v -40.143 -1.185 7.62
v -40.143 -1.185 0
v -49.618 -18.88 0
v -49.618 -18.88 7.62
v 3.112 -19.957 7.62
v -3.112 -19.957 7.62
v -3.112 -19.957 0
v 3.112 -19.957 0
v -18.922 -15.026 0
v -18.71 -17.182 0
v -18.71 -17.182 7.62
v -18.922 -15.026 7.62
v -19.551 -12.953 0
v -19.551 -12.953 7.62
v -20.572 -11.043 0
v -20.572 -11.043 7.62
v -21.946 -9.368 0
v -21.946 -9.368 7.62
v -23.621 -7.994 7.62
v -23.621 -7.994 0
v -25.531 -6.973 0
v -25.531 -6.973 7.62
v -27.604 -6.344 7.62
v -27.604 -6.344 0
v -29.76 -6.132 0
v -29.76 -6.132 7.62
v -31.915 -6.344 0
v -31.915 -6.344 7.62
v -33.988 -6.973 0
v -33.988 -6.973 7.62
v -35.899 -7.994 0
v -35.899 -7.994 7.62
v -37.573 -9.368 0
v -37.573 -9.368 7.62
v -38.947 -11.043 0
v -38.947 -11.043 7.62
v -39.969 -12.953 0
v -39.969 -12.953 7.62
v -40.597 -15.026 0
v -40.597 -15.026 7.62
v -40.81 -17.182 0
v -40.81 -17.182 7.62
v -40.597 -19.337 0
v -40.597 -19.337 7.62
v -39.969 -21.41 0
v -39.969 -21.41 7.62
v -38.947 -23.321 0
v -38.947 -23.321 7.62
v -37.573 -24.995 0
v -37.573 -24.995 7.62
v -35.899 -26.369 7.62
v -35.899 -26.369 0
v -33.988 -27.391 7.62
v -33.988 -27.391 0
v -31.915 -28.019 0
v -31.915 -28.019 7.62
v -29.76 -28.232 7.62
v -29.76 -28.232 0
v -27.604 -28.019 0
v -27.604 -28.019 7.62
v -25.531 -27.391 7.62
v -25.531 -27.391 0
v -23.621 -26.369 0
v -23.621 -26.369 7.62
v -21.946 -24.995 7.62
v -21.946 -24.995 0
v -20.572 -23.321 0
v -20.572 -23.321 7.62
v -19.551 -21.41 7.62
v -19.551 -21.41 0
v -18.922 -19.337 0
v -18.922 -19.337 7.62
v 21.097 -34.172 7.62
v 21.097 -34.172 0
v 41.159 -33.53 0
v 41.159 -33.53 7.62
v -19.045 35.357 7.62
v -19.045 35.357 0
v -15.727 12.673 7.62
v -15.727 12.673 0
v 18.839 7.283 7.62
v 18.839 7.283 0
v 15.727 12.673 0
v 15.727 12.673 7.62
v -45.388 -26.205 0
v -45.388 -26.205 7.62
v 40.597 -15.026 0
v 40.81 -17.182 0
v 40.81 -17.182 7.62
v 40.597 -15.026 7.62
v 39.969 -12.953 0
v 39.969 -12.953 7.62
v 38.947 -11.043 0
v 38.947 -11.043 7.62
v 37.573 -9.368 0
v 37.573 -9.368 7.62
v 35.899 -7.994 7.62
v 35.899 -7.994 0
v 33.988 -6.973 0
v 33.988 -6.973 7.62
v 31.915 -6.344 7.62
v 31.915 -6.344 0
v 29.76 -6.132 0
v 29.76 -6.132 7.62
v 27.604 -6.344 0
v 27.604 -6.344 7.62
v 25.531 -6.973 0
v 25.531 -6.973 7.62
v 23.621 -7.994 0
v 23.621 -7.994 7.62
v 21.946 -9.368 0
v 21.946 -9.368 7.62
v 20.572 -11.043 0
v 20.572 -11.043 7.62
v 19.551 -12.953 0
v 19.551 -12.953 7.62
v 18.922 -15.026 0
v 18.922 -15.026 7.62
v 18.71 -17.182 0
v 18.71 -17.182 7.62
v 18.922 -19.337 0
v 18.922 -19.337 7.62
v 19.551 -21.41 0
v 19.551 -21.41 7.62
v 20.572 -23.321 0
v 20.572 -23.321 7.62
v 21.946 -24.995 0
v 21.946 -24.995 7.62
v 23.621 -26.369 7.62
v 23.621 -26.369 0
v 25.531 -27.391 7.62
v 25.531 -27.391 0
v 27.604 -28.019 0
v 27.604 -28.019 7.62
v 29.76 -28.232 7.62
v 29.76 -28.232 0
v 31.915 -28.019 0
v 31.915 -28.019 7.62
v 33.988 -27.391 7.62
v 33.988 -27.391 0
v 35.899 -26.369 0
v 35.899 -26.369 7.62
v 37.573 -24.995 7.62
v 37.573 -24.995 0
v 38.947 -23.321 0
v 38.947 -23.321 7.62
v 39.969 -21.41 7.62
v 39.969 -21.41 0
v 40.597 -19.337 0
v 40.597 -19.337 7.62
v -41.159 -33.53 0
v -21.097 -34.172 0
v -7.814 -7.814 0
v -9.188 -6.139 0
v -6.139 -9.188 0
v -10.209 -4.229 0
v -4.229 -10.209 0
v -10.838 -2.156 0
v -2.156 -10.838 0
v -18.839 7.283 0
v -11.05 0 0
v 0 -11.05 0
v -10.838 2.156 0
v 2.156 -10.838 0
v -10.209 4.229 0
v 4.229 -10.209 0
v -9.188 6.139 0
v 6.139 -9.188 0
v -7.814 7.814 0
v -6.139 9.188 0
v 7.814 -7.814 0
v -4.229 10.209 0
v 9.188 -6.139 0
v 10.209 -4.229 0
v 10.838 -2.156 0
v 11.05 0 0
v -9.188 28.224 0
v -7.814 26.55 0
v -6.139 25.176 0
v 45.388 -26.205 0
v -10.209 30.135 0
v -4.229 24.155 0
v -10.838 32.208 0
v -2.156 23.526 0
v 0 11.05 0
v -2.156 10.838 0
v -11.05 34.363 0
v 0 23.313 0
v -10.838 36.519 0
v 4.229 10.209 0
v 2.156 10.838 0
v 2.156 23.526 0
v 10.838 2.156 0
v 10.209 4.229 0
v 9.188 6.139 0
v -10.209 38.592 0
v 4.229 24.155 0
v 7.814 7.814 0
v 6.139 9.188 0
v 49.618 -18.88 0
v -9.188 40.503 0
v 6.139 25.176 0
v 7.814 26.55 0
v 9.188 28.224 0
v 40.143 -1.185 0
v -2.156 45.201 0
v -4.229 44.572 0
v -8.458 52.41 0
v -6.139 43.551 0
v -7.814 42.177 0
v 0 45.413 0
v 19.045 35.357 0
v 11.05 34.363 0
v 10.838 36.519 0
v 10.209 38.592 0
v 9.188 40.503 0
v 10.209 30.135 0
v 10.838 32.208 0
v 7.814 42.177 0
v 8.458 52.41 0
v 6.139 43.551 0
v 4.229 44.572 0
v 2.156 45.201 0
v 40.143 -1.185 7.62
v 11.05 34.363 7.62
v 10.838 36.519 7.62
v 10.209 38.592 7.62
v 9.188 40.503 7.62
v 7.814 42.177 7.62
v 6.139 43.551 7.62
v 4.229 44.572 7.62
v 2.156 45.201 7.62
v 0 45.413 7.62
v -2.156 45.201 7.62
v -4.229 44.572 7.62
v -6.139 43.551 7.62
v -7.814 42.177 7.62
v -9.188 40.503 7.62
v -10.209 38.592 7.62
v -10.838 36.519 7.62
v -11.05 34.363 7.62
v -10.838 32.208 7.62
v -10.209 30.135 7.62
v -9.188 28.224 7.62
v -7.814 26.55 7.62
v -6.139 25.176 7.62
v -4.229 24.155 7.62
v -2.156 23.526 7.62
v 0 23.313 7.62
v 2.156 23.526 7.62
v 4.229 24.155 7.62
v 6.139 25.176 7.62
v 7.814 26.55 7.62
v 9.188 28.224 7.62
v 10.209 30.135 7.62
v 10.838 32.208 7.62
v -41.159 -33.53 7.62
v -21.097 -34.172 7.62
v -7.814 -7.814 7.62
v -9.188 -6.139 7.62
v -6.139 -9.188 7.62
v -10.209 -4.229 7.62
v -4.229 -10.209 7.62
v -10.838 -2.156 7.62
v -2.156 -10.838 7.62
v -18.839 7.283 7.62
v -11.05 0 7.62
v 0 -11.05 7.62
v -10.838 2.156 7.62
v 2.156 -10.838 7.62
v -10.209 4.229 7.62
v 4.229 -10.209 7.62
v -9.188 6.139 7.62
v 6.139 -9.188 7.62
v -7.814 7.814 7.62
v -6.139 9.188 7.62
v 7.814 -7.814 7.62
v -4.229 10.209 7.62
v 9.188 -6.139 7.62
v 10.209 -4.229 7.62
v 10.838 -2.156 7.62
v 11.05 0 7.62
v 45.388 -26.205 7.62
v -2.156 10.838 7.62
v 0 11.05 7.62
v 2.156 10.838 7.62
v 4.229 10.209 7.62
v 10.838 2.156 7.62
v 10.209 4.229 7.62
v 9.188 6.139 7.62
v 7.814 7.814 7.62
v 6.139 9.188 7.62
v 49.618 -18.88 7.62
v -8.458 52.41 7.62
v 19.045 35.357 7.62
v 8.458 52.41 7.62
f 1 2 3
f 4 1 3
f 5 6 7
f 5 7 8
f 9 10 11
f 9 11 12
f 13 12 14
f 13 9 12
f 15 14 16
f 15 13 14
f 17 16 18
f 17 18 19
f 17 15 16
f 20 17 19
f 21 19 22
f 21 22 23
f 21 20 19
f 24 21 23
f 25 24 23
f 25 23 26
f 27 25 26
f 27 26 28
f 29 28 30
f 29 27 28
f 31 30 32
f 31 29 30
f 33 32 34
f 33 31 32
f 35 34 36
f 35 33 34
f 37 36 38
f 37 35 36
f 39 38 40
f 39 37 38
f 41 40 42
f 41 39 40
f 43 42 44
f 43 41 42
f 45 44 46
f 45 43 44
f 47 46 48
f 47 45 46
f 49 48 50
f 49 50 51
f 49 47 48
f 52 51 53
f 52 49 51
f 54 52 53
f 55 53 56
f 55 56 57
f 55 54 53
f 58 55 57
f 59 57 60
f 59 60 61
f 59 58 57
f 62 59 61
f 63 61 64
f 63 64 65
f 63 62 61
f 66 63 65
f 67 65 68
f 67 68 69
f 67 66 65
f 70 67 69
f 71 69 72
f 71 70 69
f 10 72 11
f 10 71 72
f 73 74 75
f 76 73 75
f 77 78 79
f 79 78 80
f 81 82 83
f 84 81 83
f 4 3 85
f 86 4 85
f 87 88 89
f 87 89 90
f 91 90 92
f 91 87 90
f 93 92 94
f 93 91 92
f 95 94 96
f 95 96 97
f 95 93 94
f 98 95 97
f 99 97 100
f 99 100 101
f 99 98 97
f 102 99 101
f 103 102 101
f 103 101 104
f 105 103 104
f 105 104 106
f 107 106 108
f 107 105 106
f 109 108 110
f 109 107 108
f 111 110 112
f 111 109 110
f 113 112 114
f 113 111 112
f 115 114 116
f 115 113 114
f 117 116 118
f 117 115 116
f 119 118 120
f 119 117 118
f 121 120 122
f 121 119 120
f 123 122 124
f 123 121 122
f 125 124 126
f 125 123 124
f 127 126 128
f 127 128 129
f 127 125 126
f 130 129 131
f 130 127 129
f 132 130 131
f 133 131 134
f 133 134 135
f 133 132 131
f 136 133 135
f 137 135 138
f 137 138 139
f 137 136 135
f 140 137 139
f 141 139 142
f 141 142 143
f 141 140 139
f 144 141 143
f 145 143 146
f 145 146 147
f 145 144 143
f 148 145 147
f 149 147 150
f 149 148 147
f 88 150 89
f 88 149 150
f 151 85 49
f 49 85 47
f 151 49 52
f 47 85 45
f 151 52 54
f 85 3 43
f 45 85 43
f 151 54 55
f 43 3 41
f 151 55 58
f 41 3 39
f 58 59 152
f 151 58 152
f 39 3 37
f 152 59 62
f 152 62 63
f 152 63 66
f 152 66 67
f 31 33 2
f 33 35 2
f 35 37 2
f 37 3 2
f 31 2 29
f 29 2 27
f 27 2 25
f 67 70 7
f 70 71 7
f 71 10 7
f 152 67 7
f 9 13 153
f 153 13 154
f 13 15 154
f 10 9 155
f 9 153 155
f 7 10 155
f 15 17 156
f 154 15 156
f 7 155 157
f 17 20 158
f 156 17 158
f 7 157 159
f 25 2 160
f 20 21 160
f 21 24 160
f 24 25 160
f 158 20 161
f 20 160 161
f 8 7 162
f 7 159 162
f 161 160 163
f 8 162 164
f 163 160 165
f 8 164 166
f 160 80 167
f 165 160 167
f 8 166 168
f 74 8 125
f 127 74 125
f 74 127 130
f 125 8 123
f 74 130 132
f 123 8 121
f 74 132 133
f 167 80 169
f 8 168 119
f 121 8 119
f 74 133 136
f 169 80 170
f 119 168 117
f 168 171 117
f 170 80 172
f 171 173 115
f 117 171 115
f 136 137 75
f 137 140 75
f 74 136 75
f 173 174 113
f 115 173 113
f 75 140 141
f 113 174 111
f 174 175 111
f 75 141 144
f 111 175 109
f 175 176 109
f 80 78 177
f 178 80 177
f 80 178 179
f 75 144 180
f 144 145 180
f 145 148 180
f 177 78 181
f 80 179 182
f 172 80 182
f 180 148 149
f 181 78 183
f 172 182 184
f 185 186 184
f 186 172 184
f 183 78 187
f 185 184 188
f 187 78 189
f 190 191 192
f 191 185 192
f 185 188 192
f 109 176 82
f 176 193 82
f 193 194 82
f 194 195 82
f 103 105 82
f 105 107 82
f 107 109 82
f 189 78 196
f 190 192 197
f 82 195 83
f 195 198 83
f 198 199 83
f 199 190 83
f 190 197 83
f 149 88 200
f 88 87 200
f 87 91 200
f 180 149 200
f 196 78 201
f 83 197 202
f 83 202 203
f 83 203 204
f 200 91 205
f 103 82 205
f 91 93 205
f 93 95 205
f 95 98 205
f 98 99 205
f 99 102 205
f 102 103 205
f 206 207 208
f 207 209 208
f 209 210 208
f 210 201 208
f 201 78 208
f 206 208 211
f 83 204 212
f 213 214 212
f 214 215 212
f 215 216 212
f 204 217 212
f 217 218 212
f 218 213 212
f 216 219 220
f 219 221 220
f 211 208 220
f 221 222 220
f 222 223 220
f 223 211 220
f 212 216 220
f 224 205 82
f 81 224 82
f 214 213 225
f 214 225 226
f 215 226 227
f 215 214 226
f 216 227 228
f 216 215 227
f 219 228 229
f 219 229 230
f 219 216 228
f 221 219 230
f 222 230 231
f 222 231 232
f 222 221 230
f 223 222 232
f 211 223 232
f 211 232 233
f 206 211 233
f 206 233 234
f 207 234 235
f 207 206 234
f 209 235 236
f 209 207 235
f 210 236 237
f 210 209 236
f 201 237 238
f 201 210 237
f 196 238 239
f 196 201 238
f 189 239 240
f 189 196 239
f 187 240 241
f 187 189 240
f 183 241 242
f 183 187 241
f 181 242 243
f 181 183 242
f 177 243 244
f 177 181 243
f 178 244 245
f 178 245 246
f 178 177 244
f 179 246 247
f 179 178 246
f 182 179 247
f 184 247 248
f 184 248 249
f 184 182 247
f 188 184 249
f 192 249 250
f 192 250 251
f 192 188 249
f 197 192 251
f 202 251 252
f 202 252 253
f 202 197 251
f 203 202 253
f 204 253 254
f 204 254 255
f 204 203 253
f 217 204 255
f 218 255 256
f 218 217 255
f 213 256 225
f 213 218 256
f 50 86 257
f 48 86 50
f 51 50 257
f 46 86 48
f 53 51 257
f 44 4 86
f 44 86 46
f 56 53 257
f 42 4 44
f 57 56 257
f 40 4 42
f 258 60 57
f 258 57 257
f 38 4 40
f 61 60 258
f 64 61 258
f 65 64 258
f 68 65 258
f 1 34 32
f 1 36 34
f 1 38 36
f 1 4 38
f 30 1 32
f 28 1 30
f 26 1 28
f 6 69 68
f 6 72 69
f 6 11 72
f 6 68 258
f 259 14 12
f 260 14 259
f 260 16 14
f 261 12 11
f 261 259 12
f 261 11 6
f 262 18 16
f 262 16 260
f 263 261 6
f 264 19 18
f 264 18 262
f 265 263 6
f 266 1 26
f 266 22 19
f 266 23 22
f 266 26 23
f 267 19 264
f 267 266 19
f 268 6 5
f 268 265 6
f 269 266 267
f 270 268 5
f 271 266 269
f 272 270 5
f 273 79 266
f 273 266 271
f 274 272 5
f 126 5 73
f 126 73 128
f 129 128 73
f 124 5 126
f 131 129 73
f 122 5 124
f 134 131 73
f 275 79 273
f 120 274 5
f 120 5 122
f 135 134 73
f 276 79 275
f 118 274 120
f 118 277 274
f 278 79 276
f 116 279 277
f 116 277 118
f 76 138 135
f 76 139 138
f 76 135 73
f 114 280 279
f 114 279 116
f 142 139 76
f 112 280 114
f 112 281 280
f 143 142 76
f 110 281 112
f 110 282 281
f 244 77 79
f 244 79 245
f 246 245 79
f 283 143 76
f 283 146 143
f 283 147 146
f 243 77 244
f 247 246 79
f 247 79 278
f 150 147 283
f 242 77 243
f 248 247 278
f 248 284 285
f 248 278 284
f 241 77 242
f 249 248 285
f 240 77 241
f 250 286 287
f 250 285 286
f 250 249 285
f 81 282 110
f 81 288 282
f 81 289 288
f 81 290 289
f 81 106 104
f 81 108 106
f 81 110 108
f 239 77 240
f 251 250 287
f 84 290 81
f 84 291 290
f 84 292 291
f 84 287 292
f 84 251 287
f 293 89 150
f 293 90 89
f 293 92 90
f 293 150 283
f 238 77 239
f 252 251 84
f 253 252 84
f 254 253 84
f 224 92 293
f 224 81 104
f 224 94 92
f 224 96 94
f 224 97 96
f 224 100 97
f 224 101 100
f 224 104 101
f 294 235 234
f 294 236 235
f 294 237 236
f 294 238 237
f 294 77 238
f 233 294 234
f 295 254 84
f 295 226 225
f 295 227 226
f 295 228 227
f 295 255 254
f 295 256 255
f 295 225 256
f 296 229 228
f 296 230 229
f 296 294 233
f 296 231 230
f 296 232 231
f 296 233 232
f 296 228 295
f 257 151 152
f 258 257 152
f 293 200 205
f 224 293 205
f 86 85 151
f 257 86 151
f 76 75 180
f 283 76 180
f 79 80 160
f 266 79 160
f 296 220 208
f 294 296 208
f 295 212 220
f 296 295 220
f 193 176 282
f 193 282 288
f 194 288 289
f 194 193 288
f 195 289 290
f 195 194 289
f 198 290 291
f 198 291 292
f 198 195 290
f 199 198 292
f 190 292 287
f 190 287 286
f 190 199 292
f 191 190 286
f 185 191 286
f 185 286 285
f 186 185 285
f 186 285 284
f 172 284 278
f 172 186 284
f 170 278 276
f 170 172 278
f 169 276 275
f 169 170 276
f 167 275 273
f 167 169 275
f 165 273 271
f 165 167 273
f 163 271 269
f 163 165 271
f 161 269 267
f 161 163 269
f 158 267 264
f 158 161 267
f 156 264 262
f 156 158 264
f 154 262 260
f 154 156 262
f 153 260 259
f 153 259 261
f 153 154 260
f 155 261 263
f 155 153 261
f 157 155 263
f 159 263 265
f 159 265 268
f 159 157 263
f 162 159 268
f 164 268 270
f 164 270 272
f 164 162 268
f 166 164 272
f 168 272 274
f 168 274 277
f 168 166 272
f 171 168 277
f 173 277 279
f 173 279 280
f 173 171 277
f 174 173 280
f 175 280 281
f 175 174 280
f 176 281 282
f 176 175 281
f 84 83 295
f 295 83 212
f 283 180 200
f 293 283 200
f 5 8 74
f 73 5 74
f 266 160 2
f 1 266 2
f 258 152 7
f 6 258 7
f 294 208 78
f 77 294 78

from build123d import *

# Parameters (mm, degrees)
F0_R     = 11.05
F1_DEPTH = 7.62


with BuildPart() as f1:
    # F0 (on Top) → F1 (new body)
    with BuildSketch(Plane.XY):
        Polygon((0, 52.410126), (-8.458121, 52.410126), (-19.045388, 35.357095), (-15.727155, 12.67334), (-18.839012, 7.283446), (-40.142837, -1.184758), (-49.617561, -18.880115), (-45.3885, -26.205063), (-41.15944, -33.53001), (-21.097449, -34.172338), (-3.111857, -19.956786), (3.111857, -19.956786), (21.097449, -34.172338), (41.15944, -33.53001), (45.3885, -26.205063), (49.617561, -18.880115), (40.142837, -1.184758), (18.839012, 7.283446), (15.727155, 12.67334), (19.045388, 35.357095), (8.458121, 52.410126), align=None)
        with Locations((-29.759655, -17.181745)):
            Circle(F0_R, mode=Mode.SUBTRACT)
        with Locations((29.759655, -17.181745)):
            Circle(F0_R, mode=Mode.SUBTRACT)
        Circle(F0_R, mode=Mode.SUBTRACT)
        with Locations((0, 34.363489)):
            Circle(F0_R, mode=Mode.SUBTRACT)
    extrude(amount=F1_DEPTH)


solid = f1.part
